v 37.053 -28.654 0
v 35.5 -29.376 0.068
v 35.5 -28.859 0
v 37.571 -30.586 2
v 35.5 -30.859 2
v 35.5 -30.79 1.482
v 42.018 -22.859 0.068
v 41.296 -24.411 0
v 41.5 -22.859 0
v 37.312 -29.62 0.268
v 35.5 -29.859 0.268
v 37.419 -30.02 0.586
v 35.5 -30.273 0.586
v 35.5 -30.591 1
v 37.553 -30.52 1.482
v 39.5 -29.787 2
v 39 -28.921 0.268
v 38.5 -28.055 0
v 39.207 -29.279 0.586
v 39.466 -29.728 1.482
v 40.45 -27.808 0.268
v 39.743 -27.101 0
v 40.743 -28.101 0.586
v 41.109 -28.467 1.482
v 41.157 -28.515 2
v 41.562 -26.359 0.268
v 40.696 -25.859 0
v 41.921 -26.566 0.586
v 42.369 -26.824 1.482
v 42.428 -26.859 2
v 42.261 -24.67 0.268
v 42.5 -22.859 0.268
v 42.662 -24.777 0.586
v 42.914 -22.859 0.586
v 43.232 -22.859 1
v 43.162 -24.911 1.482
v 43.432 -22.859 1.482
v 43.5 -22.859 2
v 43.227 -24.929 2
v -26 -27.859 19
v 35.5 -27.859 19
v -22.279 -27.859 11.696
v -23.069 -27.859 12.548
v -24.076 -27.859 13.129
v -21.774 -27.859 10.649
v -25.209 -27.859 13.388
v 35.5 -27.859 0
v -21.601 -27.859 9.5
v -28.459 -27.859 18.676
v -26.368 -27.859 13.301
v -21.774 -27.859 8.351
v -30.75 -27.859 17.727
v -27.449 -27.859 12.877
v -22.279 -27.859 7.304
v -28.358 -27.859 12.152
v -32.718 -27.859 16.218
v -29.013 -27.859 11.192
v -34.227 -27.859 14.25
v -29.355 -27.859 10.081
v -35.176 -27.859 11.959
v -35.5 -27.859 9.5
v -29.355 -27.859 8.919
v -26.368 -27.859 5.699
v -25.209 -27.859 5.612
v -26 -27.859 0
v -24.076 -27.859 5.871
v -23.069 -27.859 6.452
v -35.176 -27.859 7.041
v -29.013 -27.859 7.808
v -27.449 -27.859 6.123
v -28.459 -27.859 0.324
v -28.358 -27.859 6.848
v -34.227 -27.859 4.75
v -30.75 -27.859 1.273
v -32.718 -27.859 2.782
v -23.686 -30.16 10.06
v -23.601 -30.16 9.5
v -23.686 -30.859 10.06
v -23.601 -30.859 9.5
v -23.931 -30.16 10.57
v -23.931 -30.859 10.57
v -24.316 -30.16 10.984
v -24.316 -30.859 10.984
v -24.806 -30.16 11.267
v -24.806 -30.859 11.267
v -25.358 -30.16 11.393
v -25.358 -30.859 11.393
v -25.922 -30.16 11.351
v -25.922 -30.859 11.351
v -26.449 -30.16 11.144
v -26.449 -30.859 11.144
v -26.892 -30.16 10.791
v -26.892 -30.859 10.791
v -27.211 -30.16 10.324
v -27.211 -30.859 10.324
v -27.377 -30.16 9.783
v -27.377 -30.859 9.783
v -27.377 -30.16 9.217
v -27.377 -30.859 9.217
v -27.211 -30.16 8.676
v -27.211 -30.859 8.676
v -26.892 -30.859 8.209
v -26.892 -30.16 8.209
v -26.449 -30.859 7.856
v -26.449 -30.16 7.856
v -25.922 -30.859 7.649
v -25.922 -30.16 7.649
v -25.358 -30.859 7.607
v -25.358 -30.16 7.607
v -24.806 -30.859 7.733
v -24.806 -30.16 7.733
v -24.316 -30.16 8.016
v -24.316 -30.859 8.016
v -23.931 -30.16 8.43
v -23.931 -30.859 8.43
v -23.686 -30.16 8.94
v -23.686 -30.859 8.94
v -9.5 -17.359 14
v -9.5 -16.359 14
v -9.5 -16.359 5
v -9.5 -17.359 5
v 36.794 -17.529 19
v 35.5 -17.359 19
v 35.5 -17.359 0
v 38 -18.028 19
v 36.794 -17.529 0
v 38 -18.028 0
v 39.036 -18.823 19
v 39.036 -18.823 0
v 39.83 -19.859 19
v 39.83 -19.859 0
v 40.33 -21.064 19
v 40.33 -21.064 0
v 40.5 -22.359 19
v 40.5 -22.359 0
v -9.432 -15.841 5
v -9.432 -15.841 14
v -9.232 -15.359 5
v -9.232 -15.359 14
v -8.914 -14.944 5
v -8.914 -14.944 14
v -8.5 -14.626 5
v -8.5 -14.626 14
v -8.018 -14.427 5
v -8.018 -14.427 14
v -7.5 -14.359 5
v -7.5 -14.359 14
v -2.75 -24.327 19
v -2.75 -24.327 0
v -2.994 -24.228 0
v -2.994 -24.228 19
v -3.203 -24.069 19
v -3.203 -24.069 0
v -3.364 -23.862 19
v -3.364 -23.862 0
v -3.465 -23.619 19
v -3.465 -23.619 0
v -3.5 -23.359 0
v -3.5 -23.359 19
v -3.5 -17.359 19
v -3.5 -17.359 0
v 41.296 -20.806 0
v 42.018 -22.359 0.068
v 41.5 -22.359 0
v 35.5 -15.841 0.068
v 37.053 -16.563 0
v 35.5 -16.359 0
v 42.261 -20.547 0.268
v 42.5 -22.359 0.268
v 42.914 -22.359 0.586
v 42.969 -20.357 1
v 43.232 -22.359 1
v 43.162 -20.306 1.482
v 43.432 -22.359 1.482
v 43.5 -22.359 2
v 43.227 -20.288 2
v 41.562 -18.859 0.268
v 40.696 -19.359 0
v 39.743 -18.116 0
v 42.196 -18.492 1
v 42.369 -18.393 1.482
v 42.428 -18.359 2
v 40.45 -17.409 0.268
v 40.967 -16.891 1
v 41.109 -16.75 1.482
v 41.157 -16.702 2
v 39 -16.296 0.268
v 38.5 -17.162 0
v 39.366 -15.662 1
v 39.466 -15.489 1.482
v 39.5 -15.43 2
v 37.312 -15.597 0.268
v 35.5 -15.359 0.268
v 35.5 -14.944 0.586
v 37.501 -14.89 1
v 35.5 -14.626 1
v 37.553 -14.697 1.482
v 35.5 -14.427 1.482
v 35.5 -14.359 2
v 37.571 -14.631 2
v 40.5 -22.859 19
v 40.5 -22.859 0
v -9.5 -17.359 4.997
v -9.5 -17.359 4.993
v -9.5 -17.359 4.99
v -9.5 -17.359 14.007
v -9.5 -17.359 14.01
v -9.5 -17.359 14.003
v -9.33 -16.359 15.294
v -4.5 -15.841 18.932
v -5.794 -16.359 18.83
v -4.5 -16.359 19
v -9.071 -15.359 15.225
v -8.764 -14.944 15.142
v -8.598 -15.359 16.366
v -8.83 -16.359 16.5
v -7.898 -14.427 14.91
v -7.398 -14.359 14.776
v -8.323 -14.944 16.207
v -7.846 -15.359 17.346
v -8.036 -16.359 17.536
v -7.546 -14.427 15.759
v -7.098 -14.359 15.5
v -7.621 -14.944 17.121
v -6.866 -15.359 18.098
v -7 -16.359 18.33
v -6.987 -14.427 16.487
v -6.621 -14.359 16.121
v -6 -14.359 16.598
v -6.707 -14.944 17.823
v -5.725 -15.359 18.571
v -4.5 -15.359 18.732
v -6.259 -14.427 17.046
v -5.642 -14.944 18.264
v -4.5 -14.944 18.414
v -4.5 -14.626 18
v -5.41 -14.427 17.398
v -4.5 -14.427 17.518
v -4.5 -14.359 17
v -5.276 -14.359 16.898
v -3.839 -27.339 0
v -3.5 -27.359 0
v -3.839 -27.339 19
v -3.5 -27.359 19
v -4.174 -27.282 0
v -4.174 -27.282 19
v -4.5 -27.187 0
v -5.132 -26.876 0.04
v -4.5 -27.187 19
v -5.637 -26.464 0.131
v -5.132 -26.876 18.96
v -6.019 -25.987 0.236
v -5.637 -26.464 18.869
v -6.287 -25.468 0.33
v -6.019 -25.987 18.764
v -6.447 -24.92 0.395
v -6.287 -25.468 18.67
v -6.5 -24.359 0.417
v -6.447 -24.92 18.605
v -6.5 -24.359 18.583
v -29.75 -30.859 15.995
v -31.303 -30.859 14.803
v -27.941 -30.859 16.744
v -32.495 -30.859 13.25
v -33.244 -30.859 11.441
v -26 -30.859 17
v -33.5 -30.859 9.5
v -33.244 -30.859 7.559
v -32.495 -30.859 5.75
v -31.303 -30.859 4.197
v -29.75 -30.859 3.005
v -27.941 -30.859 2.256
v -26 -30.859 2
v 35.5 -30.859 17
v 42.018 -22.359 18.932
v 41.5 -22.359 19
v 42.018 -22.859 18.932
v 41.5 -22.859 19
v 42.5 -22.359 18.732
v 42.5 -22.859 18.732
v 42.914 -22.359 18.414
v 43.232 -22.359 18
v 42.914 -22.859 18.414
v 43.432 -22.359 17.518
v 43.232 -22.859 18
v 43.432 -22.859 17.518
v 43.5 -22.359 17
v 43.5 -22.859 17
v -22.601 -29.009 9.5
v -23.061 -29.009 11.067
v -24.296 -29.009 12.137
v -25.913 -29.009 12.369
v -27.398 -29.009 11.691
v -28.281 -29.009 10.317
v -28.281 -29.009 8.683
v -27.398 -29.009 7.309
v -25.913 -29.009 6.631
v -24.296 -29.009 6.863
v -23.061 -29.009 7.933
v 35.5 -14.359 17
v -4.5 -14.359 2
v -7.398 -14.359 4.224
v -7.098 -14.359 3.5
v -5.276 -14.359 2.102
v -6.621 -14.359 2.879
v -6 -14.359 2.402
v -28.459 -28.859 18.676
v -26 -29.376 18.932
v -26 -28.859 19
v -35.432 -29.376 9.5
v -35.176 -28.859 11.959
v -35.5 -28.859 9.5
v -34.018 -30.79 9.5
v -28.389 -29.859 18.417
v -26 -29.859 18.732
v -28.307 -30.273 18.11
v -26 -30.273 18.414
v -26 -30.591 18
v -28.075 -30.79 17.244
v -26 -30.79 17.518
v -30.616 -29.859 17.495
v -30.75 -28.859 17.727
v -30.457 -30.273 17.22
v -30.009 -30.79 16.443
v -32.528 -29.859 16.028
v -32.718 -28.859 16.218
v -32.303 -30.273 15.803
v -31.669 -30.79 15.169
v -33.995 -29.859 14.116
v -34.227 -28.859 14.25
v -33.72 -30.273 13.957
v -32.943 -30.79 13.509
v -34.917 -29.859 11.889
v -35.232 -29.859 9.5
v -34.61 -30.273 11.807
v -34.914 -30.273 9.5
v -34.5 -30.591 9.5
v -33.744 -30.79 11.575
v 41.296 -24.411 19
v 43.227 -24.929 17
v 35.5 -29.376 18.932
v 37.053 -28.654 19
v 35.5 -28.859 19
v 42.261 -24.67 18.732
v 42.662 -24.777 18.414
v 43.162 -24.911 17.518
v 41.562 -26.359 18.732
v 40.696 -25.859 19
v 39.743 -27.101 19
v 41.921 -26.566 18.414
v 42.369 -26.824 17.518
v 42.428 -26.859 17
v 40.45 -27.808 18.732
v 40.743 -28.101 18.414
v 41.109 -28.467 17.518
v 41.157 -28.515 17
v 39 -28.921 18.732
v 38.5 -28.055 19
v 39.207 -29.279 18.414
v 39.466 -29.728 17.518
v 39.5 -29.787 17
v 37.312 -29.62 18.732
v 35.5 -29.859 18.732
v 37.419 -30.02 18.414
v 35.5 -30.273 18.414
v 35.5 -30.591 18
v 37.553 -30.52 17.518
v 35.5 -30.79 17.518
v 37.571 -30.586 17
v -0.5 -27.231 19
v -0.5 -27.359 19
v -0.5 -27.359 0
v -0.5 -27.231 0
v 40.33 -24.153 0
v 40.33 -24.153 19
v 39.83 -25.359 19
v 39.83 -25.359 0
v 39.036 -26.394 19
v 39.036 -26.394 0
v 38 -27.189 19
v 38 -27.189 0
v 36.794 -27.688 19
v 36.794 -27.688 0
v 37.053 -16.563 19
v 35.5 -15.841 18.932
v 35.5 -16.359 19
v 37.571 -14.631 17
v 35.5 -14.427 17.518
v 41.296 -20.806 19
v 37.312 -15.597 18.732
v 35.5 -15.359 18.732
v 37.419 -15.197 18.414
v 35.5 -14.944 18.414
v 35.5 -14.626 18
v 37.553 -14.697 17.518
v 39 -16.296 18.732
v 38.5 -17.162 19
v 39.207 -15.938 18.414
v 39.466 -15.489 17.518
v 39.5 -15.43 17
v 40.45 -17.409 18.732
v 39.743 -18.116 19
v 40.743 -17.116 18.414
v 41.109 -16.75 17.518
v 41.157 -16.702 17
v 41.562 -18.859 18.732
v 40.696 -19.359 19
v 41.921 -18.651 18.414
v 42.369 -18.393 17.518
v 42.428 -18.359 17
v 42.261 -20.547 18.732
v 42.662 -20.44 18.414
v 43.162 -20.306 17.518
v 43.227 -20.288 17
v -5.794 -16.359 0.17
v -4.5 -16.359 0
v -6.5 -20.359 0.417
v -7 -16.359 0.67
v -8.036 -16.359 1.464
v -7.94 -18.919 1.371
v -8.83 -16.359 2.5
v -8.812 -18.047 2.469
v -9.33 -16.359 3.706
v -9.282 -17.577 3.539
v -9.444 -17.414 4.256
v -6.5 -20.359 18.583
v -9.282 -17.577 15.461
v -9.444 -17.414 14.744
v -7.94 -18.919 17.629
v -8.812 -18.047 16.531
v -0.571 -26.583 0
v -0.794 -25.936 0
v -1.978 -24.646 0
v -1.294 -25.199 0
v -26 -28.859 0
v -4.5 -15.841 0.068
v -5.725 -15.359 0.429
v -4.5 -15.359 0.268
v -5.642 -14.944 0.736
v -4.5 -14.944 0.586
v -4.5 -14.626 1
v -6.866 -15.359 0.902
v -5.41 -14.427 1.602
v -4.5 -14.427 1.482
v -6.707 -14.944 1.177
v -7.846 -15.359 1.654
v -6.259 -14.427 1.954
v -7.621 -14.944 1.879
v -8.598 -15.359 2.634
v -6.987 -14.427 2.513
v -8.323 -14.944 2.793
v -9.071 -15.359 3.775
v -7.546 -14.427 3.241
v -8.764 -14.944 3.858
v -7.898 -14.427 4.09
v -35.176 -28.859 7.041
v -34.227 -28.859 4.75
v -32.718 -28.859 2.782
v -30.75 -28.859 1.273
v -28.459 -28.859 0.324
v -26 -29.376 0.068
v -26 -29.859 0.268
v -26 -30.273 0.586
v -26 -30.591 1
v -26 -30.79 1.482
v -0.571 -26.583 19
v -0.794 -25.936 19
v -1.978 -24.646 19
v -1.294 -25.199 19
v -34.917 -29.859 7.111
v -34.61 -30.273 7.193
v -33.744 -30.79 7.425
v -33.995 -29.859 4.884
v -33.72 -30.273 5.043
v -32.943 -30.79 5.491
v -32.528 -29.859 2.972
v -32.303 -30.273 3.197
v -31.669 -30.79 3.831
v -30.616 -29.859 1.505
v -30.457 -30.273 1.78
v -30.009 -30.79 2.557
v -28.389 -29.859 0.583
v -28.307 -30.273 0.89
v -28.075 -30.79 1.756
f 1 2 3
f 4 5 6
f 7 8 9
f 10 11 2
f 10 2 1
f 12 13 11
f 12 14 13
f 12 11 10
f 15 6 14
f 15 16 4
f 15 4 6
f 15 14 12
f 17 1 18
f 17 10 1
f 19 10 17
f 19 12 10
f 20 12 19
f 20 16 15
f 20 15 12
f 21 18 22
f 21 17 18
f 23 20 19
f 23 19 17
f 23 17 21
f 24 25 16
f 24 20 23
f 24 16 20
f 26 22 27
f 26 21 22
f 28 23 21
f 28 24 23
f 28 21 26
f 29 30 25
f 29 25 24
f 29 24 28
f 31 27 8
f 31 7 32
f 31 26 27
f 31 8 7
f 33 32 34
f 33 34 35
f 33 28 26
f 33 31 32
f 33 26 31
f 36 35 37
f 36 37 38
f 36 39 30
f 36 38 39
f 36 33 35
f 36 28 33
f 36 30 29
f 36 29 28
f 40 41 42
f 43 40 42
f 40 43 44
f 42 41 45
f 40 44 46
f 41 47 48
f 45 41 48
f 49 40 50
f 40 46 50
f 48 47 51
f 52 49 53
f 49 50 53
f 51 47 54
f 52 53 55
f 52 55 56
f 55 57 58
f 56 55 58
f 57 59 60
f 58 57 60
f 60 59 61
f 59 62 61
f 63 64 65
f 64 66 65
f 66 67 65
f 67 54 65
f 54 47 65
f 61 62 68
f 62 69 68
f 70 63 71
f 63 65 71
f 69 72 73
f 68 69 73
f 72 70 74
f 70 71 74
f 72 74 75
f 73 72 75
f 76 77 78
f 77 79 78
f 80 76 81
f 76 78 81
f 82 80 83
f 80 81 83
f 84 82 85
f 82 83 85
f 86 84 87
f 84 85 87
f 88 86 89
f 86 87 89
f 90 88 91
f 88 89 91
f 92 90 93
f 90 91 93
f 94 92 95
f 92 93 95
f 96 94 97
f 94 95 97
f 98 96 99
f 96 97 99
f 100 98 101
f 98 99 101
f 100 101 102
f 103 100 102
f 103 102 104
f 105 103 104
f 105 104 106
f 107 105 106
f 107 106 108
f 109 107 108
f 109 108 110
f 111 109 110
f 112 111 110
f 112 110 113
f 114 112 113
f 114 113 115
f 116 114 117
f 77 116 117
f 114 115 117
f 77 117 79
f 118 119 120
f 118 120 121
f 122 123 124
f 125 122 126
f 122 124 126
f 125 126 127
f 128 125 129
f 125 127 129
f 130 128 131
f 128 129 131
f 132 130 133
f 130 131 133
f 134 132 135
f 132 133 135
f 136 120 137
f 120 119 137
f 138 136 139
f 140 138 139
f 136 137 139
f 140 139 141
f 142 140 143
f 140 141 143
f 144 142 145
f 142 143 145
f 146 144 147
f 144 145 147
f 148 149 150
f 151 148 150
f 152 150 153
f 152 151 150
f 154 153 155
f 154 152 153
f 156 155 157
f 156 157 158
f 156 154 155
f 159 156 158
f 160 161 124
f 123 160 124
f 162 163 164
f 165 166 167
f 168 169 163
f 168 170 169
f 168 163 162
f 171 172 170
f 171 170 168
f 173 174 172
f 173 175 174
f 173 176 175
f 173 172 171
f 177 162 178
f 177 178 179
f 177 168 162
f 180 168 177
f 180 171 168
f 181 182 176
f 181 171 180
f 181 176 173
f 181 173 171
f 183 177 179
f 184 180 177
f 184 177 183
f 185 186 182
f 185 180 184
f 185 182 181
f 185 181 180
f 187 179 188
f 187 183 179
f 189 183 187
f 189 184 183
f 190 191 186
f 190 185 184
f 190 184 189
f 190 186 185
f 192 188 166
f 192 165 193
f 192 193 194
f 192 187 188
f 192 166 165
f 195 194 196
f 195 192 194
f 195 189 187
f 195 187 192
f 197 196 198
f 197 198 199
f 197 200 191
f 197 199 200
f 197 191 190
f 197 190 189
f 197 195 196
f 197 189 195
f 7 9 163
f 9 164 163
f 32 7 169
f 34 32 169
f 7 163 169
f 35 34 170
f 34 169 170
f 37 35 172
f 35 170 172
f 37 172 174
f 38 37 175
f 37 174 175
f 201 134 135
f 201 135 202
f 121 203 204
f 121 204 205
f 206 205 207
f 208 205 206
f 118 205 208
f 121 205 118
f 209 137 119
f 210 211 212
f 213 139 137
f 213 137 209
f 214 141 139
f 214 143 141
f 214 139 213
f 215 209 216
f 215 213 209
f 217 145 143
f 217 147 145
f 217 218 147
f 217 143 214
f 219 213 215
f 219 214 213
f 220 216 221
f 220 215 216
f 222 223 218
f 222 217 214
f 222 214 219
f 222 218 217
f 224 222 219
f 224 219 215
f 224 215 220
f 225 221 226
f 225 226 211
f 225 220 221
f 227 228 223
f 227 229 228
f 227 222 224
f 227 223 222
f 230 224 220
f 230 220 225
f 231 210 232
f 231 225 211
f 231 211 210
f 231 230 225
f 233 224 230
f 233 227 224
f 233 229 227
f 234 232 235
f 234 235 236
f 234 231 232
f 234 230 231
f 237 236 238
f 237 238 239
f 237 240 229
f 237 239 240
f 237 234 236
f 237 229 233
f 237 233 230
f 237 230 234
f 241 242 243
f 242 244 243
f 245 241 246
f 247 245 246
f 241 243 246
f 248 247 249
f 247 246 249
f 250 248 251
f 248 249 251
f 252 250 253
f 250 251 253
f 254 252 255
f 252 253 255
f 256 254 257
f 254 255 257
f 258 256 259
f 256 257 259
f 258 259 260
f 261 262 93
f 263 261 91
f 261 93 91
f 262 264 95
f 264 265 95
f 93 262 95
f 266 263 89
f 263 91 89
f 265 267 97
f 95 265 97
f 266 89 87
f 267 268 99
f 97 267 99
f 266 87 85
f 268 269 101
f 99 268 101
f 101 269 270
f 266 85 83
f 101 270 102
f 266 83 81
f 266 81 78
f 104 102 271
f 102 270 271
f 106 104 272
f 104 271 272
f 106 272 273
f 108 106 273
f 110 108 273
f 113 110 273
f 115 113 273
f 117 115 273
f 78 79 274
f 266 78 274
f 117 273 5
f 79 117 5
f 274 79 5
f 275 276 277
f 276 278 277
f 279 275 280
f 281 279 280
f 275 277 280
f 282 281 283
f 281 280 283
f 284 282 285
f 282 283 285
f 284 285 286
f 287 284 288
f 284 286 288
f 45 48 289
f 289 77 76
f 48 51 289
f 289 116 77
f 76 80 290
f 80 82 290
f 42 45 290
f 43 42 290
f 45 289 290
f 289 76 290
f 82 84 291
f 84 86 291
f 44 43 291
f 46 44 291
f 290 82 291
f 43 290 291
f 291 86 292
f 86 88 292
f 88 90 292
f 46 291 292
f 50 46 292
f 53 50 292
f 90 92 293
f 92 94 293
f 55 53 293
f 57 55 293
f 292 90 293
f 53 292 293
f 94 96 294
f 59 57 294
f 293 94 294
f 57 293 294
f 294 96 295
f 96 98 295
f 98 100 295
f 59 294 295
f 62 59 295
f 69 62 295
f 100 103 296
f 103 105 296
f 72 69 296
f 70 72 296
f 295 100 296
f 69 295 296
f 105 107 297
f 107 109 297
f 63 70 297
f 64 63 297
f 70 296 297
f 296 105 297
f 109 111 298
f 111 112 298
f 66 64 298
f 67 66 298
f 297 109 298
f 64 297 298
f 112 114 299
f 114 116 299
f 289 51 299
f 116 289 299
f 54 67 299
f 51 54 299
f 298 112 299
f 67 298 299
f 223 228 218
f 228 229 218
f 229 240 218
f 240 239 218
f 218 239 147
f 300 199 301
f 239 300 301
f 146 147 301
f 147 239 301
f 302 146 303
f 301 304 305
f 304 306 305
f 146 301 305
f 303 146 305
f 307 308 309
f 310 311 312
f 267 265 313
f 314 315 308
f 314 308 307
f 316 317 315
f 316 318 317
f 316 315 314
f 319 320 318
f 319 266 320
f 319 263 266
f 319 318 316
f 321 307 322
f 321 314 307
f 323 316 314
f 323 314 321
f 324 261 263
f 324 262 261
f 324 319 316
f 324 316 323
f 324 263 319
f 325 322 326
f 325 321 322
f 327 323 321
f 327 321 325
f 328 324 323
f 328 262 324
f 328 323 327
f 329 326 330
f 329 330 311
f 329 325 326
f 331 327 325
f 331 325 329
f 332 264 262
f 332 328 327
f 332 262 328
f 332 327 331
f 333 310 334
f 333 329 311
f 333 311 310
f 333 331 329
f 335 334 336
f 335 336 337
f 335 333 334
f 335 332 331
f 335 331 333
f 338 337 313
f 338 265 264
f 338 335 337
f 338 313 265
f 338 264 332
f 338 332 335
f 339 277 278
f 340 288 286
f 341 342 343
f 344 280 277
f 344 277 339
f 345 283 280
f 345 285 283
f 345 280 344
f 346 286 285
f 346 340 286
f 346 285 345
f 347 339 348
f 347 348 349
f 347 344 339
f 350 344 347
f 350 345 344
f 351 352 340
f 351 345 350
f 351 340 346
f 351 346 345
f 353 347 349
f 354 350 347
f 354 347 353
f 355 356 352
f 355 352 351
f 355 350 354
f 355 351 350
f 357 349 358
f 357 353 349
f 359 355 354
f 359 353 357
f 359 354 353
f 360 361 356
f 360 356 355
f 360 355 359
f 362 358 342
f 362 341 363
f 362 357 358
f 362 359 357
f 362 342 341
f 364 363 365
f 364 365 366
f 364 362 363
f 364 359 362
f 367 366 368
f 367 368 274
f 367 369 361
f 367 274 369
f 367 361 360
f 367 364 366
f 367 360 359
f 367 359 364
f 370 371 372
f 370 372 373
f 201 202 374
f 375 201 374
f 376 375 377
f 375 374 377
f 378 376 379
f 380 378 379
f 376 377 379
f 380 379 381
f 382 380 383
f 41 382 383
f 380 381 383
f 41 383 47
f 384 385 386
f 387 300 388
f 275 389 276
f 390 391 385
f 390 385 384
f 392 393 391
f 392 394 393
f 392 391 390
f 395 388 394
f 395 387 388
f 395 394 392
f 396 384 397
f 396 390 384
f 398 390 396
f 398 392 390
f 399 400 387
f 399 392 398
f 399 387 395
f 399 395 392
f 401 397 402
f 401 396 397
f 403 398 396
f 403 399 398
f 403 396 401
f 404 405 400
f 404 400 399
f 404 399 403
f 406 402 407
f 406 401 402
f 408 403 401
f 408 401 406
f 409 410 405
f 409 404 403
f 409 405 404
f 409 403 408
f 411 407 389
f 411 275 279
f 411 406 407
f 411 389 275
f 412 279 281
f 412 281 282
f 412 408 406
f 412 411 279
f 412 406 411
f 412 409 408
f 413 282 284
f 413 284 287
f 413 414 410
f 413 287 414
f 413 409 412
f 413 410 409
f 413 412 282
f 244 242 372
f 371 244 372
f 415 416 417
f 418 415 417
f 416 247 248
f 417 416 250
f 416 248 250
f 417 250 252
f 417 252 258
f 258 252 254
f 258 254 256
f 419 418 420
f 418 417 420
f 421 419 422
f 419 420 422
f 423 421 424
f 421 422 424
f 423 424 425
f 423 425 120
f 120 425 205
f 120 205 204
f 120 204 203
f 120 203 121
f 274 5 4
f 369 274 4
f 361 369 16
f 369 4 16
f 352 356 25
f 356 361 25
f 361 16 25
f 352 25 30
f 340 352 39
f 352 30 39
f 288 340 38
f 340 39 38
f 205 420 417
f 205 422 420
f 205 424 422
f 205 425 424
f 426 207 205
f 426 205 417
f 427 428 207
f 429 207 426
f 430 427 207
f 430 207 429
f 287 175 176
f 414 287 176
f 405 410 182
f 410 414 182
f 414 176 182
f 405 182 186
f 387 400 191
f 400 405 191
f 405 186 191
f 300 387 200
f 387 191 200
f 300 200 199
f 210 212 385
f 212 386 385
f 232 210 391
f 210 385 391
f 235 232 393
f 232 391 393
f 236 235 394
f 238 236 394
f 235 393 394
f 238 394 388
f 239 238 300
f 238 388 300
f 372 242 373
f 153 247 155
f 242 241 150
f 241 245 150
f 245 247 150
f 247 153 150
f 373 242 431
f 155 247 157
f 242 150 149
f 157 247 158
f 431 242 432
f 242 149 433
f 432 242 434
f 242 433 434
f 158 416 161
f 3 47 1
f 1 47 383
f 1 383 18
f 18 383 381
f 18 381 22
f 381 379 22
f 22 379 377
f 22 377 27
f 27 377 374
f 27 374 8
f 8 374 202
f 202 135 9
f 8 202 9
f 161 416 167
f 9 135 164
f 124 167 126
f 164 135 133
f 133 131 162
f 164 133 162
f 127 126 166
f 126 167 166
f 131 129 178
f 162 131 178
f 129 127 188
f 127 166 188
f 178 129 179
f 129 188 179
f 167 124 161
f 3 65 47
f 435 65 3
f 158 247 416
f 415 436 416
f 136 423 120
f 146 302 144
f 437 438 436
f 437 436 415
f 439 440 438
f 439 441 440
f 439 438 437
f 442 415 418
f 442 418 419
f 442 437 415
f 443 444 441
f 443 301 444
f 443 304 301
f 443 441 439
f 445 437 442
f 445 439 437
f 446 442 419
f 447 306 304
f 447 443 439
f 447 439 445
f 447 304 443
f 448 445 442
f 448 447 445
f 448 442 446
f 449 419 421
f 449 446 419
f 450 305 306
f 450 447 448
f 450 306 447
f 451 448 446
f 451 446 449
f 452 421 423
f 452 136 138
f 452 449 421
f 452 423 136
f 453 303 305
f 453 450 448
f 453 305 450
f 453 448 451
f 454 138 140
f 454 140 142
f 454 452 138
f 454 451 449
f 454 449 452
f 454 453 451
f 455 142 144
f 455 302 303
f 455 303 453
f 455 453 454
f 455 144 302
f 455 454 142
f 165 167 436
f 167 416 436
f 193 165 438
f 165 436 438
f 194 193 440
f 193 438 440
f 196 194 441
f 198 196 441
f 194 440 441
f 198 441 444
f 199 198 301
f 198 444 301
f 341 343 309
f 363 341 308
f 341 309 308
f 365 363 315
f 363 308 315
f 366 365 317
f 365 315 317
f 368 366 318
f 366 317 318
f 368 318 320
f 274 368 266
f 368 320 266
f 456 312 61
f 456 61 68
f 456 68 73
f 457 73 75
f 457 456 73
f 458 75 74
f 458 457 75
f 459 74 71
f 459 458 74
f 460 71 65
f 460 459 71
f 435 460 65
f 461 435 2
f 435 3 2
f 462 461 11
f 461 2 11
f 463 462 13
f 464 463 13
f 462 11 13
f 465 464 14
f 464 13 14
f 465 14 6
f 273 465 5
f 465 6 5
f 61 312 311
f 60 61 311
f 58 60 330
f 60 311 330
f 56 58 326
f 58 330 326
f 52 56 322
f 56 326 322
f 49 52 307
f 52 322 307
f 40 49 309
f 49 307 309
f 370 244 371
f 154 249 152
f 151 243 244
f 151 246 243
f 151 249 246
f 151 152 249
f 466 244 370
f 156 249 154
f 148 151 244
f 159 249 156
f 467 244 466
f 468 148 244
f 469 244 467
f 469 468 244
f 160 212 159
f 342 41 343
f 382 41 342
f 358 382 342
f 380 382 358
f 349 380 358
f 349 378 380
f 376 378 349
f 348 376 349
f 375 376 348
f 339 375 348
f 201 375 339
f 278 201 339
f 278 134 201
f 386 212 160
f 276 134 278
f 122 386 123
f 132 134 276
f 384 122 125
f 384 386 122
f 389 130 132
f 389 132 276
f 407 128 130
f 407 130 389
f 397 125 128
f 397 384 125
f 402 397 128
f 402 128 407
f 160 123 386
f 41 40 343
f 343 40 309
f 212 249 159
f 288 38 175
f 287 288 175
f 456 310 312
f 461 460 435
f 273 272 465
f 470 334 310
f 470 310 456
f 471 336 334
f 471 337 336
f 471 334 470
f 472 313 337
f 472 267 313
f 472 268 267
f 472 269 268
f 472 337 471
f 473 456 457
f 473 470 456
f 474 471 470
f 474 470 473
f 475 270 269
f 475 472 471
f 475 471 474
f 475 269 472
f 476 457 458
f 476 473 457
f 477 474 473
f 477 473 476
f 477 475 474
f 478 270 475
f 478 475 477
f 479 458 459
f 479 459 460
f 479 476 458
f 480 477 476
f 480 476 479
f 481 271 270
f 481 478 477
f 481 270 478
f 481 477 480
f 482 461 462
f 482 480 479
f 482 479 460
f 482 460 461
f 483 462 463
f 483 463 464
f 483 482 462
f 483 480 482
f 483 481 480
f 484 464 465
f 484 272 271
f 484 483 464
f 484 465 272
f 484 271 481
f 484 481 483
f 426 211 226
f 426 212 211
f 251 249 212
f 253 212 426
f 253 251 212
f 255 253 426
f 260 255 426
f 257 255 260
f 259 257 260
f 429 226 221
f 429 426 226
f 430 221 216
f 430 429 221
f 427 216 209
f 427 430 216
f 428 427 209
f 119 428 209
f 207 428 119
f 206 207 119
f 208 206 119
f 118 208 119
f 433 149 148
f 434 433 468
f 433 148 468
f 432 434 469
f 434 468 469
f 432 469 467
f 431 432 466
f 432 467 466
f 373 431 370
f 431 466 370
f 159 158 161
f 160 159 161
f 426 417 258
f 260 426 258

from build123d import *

# Parameters (mm, degrees)
F2_W            = 3
F2_H            = 3
F3_DEPTH        = 19
F5_R            = 9.49999
F6_R            = 5
F7_R            = 2
F8_R            = 1
F9_SIZE         = 2.99999
F10_D           = 3.7973
F10_CSINK_D     = 7.7978
F10_CSINK_ANGLE = 82
F11_R           = 2.9999


# Not quite as in the source:
# - a fillet or chamfer is up to 0.001 mm smaller than in the source, because OpenCascade refuses the exact size


with BuildPart() as f3:
    # F2 (on Top) → F3 (new body)
    with BuildSketch(Plane.XY):
        with BuildLine():
            Line((35.5, -27.8585158202), (-35.5, -27.8585158202))
            Line((-35.5, -27.8585158202), (-35.5, -30.8585158202))
            Line((-35.5, -30.8585158202), (35.5, -30.8585158202))
            ThreePointArc((35.5, -30.8585158202), (41.1568542495, -28.5153700696), (43.5, -22.8585158202))
            Line((43.5, -22.8585158202), (43.5, -22.3585158202))
            ThreePointArc((43.5, -22.3585158202), (41.1568542495, -16.7016615707), (35.5, -14.3585158202))
            Line((35.5, -14.3585158202), (-6.5, -14.3585158202))
            Line((-6.5, -14.3585158202), (-6.5, -16.3585158202))
            Line((-6.5, -16.3585158202), (-6.5, -17.3585158202))
            Line((-6.5, -17.3585158202), (-3.5, -17.3585158202))
            Line((-3.5, -17.3585158202), (35.5, -17.3585158202))
            ThreePointArc((35.5, -17.3585158202), (39.0355339059, -18.8229819142), (40.5, -22.3585158202))
            Line((40.5, -22.3585158202), (40.5, -22.8585158202))
            ThreePointArc((40.5, -22.8585158202), (39.0355339059, -26.3940497261), (35.5, -27.8585158202))
        make_face()
        with Locations((-2, -25.8585158202)):
            Rectangle(F2_W, F2_H)
        Polygon((-3.5, -24.3585158202), (-3.5, -17.3585158202), (-6.5, -17.3585158202), (-6.5, -27.3585158202), (-3.5, -27.3585158202), align=None)
        Polygon((-9.5, -17.3585158202), (-6.5, -17.3585158202), (-6.5, -16.3585158202), (-6.5, -14.3585158202), (-9.5, -14.3585158202), align=None)
    extrude(amount=F3_DEPTH)

    # F5 (radius 9.5 in the source; OpenCascade refuses exactly that, so slightly less here)
    f5_edges = [f3.edges().sort_by_distance(p)[0] for p in [
        (-35.5, -29.358516, 19),
        (-35.5, -29.358516, 0),
    ]]
    fillet(f5_edges, radius=F5_R)

    # F6
    f6_edges = [f3.edges().sort_by_distance(p)[0] for p in [
        (-9.5, -15.858516, 19),
        (-9.5, -15.858516, 0),
    ]]
    fillet(f6_edges, radius=F6_R)

    # F7
    f7_edges = [f3.edges().sort_by_distance(p)[0] for p in [
        (15.5, -14.358516, 0),
    ]]
    fillet(f7_edges, radius=F7_R)

    # F8
    f8_edges = [f3.edges().sort_by_distance(p)[0] for p in [
        (-3.5, -24.358516, 9.5),
    ]]
    fillet(f8_edges, radius=F8_R)

    # F9 (size 3 in the source; OpenCascade refuses exactly that, so slightly less here)
    f9_edges = [f3.edges().sort_by_distance(p)[0] for p in [
        (-6.5, -17.358516, 9.5),
    ]]
    chamfer(f9_edges, length=F9_SIZE)

    # F10 (through all)
    with Locations(Plane(origin=(0, -27.8585158202, 0), x_dir=(-1, 0, 0), z_dir=(0, 1, 0))):
        with Locations((25.5, 9.5)):
            CounterSinkHole(F10_D / 2, F10_CSINK_D / 2, counter_sink_angle=F10_CSINK_ANGLE)

    # F11 (radius 3 in the source; OpenCascade refuses exactly that, so slightly less here)
    f11_edges = [f3.edges().sort_by_distance(p)[0] for p in [
        (-0.5, -24.358516, 9.5),
        (-6.5, -27.358516, 9.5),
    ]]
    fillet(f11_edges, radius=F11_R)


solid = f3.part
